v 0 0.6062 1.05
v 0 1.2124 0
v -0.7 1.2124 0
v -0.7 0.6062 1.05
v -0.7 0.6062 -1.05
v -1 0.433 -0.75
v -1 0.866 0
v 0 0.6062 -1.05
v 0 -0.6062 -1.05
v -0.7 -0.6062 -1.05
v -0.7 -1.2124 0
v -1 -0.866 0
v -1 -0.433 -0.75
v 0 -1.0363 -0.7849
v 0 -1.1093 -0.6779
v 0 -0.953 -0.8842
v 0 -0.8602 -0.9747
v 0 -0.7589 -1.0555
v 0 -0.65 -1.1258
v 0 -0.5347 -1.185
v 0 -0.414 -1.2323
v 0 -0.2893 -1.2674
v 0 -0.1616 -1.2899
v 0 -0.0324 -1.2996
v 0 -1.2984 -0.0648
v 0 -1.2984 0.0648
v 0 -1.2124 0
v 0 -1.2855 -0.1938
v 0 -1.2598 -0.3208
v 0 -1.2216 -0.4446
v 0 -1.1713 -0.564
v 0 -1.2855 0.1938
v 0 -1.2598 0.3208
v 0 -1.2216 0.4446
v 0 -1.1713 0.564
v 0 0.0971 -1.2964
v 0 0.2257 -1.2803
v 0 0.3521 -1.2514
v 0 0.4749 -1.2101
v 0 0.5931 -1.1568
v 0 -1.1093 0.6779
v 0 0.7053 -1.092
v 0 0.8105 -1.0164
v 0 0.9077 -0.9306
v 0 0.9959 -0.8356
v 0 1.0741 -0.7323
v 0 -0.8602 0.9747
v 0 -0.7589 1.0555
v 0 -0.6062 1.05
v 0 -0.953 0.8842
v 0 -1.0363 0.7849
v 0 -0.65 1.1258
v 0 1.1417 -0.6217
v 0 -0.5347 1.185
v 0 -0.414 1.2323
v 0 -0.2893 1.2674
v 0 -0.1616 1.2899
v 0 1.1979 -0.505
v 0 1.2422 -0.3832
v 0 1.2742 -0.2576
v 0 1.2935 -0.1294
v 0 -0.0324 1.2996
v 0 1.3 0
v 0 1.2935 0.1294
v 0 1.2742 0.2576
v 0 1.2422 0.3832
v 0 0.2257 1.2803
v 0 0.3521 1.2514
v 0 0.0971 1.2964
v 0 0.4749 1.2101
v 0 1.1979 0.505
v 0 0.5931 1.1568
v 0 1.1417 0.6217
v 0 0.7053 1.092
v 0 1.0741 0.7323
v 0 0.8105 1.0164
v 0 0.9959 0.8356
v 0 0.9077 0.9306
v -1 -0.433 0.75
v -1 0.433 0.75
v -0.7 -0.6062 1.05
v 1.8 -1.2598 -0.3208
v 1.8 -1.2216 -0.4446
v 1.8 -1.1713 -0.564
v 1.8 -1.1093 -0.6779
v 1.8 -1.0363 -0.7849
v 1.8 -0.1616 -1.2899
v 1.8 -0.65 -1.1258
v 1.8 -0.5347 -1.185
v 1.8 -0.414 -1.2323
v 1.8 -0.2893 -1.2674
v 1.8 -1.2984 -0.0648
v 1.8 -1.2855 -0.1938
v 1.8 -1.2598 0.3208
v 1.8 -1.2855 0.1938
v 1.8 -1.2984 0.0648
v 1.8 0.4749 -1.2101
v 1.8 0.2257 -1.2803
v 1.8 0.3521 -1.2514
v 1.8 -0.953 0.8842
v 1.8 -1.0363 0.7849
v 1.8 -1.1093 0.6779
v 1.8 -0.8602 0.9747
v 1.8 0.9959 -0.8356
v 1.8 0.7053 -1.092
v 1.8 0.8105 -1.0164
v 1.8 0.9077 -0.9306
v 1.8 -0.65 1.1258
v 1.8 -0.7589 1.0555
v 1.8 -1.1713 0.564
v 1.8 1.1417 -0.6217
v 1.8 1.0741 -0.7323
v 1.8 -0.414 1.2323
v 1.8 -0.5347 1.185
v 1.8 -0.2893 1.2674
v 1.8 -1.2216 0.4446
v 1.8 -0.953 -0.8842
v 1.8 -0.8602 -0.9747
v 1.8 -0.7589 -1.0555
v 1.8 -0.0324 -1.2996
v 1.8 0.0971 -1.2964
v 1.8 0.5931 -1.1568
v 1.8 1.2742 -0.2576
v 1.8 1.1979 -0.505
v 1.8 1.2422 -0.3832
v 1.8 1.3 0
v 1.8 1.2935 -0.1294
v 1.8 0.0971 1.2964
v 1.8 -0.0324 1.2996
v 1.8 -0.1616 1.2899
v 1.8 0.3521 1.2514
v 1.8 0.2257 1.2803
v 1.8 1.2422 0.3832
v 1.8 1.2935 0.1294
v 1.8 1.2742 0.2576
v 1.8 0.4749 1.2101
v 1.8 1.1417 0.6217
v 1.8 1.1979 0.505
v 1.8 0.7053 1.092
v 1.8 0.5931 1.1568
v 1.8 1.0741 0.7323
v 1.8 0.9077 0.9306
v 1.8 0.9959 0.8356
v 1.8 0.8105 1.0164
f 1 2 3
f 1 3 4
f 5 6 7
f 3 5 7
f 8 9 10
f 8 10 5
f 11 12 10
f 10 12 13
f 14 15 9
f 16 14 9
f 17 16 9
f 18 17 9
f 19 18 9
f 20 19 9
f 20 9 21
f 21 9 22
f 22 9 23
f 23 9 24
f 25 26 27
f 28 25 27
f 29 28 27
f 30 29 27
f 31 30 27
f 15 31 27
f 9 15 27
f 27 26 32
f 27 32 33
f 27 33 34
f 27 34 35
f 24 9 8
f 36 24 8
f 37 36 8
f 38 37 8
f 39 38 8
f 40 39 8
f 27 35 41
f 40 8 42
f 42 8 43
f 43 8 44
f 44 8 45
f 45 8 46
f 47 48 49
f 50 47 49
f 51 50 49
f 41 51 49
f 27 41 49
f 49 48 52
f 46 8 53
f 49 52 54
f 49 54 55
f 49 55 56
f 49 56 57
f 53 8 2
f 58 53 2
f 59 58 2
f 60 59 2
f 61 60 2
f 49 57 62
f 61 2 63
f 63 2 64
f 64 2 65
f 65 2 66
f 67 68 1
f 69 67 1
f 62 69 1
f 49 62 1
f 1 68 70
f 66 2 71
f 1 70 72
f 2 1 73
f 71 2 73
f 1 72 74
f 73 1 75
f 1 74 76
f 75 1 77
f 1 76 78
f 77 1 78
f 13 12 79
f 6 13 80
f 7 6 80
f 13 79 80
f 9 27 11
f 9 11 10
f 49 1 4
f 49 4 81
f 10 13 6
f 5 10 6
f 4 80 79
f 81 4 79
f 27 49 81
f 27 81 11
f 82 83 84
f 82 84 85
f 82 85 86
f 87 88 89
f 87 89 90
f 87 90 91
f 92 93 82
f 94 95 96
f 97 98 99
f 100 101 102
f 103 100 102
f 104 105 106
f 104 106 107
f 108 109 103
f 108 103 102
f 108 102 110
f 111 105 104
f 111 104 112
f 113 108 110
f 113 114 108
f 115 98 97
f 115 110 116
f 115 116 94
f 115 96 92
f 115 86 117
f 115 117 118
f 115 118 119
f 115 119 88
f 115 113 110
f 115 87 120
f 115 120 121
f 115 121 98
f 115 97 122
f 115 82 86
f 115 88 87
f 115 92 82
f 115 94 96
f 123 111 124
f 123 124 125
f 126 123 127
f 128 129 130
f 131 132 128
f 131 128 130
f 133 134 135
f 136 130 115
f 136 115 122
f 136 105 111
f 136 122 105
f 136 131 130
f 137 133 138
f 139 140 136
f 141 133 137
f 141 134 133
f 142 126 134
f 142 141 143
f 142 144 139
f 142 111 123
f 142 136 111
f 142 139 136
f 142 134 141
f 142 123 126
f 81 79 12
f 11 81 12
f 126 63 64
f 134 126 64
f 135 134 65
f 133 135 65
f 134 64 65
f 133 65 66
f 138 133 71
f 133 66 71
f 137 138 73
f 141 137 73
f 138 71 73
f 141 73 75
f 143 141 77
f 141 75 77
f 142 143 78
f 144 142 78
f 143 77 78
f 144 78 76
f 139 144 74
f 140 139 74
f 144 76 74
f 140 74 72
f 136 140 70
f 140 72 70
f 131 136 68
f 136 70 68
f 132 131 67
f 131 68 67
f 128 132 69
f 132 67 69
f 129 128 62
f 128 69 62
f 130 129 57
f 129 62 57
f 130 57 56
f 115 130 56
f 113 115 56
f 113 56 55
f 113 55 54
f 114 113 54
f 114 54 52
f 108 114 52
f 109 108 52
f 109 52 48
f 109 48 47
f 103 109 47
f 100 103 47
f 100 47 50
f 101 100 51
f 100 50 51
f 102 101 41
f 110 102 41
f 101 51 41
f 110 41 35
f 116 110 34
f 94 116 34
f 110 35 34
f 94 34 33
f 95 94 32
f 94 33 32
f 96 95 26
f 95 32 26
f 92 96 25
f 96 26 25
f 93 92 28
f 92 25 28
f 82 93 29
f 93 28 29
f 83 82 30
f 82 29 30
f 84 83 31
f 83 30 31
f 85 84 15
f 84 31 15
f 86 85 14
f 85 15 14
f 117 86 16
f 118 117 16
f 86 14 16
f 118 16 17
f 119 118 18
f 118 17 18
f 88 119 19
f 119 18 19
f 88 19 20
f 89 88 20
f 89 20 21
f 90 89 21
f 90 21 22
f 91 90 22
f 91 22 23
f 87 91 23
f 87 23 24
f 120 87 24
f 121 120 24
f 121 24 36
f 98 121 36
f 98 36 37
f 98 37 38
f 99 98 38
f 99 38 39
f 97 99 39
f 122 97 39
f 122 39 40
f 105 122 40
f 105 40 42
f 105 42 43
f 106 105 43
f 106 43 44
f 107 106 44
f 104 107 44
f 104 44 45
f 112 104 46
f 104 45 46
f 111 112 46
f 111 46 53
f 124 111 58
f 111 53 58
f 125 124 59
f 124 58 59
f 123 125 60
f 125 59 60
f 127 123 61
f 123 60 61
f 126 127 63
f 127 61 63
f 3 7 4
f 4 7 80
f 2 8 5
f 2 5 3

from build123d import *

# Parameters (mm, degrees)
F0_R     = 1.3
F1_DEPTH = 1.8
F3_DEPTH = 1
F4_SIZE  = 0.3


with BuildPart() as f1:
    # F0 (on Right) → F1 (new body)
    with BuildSketch(Plane.YZ):
        Circle(F0_R)
    extrude(amount=F1_DEPTH)

    # F2 (on Right) → F3 (join)
    with BuildSketch(Plane.YZ):
        Polygon((0.606218, 1.05), (-0.606218, 1.05), (-1.212436, 0), (-0.606218, -1.05), (0.606218, -1.05), (1.212436, 0), align=None)
    extrude(amount=-F3_DEPTH)

    # F4
    f4_edges = [f1.edges().sort_by_distance(p)[0] for p in [
        (-1, 0, 1.05),
        (-1, -0.909327, 0.525),
        (-1, -0.909327, -0.525),
        (-1, 0, -1.05),
        (-1, 0.909327, -0.525),
        (-1, 0.909327, 0.525),
    ]]
    chamfer(f4_edges, length=F4_SIZE)


solid = f1.part
